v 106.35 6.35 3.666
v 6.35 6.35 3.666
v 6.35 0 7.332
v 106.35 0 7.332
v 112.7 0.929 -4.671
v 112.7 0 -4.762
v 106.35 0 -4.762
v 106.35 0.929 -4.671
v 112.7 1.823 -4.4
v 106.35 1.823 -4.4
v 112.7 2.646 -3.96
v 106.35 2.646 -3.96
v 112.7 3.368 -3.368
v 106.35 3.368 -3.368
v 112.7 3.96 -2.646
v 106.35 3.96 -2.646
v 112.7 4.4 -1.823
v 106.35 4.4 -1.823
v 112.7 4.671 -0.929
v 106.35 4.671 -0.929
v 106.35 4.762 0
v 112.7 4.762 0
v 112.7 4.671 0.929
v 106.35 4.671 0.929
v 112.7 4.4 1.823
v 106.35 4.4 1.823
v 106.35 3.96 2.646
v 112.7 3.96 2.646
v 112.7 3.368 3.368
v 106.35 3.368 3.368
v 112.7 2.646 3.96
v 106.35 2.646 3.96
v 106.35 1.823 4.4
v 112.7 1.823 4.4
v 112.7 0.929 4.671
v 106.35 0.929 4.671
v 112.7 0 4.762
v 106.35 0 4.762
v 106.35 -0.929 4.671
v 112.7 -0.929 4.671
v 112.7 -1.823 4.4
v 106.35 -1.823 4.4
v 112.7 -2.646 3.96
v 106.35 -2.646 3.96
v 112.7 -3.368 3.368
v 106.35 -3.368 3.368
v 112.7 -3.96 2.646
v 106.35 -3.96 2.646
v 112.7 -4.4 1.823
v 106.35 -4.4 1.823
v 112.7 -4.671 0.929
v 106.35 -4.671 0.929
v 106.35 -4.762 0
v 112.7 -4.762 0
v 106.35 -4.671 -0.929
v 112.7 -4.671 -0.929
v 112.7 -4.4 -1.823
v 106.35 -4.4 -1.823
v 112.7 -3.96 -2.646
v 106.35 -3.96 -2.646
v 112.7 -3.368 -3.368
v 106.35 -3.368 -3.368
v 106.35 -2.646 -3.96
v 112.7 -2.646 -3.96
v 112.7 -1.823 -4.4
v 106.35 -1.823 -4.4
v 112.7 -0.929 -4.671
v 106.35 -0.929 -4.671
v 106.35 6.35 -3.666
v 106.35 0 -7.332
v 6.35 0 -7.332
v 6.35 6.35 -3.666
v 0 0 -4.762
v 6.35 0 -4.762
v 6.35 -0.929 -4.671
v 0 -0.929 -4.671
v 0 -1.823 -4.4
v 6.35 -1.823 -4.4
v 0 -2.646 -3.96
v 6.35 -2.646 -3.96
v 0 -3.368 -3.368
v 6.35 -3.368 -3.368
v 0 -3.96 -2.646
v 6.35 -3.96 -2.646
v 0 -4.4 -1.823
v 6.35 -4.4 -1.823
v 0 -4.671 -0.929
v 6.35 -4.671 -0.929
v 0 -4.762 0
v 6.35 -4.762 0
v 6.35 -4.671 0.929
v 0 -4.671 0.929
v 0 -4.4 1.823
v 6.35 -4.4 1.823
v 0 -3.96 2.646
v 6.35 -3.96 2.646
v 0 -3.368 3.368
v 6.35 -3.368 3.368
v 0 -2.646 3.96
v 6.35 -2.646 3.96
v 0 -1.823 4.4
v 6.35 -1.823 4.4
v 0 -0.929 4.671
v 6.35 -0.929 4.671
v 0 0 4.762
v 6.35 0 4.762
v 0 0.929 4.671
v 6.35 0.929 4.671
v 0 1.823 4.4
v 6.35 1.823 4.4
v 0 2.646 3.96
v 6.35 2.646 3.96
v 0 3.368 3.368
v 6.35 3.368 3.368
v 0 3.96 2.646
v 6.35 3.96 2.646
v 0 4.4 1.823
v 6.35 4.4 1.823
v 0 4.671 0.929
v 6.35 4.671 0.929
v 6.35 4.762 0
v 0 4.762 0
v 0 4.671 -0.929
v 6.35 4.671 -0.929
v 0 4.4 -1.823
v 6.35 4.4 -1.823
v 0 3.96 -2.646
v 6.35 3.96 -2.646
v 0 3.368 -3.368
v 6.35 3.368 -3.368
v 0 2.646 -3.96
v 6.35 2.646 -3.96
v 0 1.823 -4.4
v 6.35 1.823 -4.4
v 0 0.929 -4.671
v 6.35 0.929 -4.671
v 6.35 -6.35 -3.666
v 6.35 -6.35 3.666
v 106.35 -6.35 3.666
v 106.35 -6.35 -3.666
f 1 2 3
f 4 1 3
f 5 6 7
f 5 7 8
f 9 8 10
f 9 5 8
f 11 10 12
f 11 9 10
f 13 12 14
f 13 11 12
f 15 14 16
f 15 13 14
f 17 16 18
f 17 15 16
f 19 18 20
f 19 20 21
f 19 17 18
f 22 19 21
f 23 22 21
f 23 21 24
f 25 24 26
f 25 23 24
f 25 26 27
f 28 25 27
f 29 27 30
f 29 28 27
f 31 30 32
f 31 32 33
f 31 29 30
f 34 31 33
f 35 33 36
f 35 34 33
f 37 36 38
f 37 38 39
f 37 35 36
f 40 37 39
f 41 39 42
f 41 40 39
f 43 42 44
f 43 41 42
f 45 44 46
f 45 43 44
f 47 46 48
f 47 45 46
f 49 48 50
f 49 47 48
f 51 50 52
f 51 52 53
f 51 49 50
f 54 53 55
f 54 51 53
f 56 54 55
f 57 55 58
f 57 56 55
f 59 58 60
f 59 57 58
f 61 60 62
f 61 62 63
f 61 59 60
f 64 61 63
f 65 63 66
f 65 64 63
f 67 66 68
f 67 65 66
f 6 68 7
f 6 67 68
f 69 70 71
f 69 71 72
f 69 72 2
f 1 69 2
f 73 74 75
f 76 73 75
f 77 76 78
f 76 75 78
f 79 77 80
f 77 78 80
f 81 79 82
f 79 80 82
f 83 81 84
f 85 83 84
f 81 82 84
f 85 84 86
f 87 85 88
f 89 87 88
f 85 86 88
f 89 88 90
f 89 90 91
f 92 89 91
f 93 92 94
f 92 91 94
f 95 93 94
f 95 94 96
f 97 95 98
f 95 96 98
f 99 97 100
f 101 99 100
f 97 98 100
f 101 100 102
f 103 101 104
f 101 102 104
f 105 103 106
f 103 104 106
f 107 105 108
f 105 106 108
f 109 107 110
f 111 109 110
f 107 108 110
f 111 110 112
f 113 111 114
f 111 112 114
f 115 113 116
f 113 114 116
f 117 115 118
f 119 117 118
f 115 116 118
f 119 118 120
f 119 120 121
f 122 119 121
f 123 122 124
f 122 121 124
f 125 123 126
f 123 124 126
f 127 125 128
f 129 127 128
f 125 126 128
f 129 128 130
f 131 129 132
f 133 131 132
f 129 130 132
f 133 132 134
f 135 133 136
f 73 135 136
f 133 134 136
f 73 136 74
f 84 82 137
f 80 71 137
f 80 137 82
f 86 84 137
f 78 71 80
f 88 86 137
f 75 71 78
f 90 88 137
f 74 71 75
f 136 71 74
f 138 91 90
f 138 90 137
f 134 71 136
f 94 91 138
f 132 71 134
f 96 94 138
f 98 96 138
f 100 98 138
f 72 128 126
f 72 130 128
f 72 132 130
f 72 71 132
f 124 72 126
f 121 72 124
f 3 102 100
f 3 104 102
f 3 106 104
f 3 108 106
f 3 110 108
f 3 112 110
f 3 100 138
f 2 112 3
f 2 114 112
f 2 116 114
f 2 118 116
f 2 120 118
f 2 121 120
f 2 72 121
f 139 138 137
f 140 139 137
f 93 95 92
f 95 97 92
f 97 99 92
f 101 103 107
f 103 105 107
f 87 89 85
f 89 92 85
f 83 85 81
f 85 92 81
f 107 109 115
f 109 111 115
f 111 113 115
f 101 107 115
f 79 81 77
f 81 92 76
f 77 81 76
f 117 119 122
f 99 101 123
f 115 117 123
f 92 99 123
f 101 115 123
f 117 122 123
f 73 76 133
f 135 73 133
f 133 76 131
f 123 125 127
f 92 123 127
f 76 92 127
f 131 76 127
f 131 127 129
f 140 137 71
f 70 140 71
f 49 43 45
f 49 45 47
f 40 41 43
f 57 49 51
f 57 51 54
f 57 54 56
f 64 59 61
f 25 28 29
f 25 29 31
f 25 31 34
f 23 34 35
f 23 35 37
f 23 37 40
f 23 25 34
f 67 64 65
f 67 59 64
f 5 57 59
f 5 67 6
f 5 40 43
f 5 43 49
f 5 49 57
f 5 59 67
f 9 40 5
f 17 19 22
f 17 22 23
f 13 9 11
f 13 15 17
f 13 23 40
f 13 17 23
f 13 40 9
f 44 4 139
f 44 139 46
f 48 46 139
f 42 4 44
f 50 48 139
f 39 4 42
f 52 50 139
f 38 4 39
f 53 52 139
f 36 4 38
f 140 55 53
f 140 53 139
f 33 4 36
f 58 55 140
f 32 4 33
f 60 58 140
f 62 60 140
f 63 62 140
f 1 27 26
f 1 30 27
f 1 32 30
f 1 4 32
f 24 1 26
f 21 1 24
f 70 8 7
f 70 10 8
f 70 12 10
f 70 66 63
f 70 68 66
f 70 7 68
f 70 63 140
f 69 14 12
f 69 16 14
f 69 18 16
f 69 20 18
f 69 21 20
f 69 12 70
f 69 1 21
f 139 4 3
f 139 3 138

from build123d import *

# Parameters (mm, degrees)
SALIENTE_EXTRUIR1_DEPTH = 112.7
CROQUIS2_R              = 7.332348419
CROQUIS2_R_2            = 4.7625
CORTAR_EXTRUIR1_DEPTH   = 6.35
CORTAR_EXTRUIR2_START   = -6.35
CROQUIS3_R              = 7.332348419
CROQUIS3_R_2            = 4.7625
CORTAR_EXTRUIR2_DEPTH   = 6.35


with BuildPart() as part:
    # Croquis1 → Saliente-Extruir1 (new body)
    with BuildSketch(Plane(origin=(0, 0, 0), x_dir=(0, 0, -1), z_dir=(1, 0, 0))):
        Polygon((7.332348419, 0), (3.666174209, 6.35), (-3.666174209, 6.35), (-7.332348419, 0), (-3.666174209, -6.35), (3.666174209, -6.35), align=None)
    extrude(amount=SALIENTE_EXTRUIR1_DEPTH)

    # Croquis2 → Cortar-Extruir1 (cut)
    with BuildSketch(Plane(origin=(112.7, 0, 0), x_dir=(0, 0, -1), z_dir=(1, 0, 0))):
        Circle(CROQUIS2_R)
        Circle(CROQUIS2_R_2, mode=Mode.SUBTRACT)
    extrude(amount=-CORTAR_EXTRUIR1_DEPTH, mode=Mode.SUBTRACT)

    # Croquis3 → Cortar-Extruir2 (cut)
    with BuildSketch(Plane.ZY.offset(CORTAR_EXTRUIR2_START)):
        Circle(CROQUIS3_R)
        with Locations(Location((0, 0, 0), (0, 0, 180))):
            Circle(CROQUIS3_R_2, mode=Mode.SUBTRACT)
    extrude(amount=CORTAR_EXTRUIR2_DEPTH, mode=Mode.SUBTRACT)


solid = part.part
